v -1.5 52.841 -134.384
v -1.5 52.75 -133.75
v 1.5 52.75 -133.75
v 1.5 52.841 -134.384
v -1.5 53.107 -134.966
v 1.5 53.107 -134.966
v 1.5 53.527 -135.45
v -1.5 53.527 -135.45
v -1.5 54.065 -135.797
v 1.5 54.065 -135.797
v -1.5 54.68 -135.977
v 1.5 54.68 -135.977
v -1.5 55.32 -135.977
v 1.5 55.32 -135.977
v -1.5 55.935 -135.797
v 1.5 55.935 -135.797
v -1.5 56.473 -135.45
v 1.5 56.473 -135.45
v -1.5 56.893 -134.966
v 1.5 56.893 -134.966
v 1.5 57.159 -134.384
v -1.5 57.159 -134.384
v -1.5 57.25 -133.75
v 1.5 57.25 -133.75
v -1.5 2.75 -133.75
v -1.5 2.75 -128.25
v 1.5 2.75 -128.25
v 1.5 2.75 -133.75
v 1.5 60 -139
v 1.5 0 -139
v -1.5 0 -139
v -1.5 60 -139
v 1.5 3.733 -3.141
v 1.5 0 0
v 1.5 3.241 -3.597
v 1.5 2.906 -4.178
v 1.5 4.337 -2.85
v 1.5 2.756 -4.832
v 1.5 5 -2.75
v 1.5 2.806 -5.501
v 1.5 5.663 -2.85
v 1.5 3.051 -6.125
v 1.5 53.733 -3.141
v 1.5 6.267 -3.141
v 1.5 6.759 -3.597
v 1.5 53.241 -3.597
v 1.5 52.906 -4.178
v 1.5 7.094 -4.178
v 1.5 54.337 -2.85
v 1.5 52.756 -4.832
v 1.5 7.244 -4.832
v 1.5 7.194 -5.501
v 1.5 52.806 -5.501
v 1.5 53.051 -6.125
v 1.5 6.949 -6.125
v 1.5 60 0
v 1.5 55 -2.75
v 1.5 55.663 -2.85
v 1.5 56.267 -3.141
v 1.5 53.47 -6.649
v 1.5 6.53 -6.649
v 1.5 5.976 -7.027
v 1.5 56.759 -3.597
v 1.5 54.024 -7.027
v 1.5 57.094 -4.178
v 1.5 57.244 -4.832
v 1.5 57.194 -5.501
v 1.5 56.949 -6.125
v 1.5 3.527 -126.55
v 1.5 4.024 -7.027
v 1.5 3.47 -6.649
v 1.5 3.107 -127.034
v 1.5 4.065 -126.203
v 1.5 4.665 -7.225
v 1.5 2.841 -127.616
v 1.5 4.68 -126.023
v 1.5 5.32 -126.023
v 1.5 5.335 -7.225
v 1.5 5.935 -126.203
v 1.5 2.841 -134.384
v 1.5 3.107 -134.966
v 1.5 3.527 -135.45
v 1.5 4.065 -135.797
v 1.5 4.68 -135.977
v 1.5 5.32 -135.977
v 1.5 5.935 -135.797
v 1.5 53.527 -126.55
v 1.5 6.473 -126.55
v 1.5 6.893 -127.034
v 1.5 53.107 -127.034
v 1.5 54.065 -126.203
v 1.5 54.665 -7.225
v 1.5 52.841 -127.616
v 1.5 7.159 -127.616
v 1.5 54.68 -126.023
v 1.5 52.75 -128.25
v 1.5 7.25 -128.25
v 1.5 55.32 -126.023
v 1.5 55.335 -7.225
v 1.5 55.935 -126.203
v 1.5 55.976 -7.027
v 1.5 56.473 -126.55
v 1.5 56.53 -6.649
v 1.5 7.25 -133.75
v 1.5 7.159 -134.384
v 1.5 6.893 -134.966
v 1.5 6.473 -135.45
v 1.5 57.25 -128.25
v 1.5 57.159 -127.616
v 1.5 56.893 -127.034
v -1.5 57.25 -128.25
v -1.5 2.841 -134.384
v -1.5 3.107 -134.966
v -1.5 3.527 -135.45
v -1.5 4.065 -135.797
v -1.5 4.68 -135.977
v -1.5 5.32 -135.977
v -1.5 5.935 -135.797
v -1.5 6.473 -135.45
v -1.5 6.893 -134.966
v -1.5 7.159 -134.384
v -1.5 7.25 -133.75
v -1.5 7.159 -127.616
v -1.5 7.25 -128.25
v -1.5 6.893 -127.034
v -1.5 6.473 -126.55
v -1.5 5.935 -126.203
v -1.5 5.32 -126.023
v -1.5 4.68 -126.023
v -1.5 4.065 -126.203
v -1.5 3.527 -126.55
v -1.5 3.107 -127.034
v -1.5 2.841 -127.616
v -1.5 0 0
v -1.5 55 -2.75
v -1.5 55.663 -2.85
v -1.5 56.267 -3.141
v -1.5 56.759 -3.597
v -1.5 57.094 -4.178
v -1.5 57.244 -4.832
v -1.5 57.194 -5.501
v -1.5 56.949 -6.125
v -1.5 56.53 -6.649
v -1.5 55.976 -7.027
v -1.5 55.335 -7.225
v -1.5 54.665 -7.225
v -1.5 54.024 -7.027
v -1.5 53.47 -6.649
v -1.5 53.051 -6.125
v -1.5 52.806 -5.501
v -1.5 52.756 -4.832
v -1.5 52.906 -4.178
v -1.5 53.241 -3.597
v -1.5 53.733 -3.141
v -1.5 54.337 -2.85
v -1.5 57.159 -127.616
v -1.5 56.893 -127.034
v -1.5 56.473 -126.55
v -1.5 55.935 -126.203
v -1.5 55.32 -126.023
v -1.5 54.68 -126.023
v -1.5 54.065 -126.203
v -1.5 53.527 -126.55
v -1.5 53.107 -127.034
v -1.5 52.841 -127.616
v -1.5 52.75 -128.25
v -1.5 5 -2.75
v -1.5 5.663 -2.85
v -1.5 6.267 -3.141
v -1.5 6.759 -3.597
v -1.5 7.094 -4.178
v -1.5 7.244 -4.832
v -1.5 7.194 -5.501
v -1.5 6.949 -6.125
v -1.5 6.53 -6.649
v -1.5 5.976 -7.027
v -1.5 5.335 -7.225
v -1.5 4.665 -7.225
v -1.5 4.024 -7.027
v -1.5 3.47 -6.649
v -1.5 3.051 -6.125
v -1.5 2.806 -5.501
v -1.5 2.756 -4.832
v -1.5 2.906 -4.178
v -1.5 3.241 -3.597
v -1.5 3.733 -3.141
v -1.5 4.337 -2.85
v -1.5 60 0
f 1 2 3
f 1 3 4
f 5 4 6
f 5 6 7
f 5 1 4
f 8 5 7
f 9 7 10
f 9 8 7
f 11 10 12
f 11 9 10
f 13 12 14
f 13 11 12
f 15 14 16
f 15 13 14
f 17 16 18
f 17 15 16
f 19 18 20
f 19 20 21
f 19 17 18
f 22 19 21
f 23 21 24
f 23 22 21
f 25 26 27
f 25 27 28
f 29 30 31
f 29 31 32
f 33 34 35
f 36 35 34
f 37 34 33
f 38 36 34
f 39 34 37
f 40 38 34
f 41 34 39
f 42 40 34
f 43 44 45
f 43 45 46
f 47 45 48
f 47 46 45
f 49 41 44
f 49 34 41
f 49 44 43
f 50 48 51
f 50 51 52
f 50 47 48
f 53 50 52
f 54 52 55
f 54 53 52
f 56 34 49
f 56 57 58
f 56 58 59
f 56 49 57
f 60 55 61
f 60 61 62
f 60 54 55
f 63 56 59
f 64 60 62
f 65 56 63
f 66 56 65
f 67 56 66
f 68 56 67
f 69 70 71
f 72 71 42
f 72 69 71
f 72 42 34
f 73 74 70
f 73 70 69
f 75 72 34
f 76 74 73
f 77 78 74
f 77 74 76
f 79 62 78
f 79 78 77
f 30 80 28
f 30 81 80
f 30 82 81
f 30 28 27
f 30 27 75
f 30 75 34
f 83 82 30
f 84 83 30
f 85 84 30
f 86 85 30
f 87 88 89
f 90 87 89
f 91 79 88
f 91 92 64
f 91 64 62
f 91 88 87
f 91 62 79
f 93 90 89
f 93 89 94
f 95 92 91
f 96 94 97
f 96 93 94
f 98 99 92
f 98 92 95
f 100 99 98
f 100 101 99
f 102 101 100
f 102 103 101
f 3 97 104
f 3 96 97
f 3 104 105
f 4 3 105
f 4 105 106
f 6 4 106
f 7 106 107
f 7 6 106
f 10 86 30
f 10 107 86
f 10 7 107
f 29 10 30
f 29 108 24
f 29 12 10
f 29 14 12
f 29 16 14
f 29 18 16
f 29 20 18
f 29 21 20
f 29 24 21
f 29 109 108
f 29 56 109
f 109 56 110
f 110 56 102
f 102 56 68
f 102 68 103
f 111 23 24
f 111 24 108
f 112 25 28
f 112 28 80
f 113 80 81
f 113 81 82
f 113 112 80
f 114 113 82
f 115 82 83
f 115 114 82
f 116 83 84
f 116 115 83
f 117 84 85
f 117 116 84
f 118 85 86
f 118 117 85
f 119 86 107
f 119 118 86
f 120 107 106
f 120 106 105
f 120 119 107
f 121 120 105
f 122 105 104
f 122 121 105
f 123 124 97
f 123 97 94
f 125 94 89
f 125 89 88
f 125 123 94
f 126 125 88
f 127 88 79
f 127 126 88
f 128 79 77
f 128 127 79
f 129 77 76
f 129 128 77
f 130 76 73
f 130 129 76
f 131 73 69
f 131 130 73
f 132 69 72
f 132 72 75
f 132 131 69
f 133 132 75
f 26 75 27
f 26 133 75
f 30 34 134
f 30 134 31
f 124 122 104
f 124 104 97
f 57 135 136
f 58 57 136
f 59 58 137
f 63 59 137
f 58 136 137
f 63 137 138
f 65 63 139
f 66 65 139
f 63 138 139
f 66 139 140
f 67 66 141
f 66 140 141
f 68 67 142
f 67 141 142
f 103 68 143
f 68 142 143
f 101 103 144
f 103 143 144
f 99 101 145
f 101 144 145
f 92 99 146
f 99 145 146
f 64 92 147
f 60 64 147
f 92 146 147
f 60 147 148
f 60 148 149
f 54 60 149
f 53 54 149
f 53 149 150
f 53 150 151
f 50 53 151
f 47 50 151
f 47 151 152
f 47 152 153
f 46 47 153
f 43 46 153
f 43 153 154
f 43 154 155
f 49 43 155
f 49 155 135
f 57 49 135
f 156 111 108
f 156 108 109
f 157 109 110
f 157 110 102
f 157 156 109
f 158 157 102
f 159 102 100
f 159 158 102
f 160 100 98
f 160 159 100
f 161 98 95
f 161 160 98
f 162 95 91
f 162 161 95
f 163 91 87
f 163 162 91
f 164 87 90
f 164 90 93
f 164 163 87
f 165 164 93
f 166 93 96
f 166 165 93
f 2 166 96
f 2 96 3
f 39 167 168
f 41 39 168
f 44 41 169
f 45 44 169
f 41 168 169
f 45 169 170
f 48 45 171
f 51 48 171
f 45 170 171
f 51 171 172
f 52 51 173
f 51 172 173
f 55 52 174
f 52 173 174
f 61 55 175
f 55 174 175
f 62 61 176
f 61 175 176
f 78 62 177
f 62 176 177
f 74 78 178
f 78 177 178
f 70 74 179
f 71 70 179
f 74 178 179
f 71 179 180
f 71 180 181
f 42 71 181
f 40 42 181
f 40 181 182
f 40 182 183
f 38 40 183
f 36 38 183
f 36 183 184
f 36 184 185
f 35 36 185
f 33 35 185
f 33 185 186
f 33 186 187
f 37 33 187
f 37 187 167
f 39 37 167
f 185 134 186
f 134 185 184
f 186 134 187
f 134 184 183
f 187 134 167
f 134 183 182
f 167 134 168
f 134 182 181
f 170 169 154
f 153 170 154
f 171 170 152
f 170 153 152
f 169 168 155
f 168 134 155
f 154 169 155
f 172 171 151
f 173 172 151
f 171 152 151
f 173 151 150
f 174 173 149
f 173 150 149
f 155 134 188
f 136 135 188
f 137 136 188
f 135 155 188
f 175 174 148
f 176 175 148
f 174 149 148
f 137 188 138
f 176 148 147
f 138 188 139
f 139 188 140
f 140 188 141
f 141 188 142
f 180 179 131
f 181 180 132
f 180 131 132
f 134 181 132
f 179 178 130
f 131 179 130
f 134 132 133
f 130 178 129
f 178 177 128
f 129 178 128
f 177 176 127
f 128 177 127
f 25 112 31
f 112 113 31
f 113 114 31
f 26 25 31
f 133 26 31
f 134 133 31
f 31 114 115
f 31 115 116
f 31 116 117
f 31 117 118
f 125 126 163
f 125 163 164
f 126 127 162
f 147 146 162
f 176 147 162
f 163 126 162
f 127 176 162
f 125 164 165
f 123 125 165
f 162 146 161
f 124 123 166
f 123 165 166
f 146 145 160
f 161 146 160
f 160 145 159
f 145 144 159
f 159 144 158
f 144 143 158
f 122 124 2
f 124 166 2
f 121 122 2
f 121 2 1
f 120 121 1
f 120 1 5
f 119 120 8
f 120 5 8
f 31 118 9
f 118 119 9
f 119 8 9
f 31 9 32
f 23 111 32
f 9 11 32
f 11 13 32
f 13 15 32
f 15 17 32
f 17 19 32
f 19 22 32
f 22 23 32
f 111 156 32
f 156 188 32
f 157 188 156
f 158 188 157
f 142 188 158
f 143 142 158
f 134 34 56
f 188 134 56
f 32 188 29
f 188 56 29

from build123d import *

# Parameters (mm, degrees)
SKETCH_1_W               = 139
SKETCH_1_H               = 60
EXTRUDE_1_DEPTH          = 1.5
HOLE_WIZARD_M4_1_D       = 4.5
HOLE_START               = -1.5
HOLE_WIZARD_M4_1_2_DEPTH = 3


# Read off the part's stored shape, not the designer's step: M4 间隙槽口1
with BuildPart() as part:
    # 草图1 → 凸台-拉伸1 (new, symmetric)
    with BuildSketch(Plane(origin=(0, 0, 0), x_dir=(0, 0, -1), z_dir=(1, 0, 0))):
        with Locations((69.5, 30)):
            Rectangle(SKETCH_1_W, SKETCH_1_H)
    extrude(amount=EXTRUDE_1_DEPTH, both=True)

    # Hole Wizard M4 _1 (through all)
    with Locations(Plane(origin=(1.5, 0, 0), x_dir=(0, 0, -1), z_dir=(1, 0, 0))):
        with Locations((5, 55), (5, 5)):
            Hole(HOLE_WIZARD_M4_1_D / 2)

    # Hole Wizard M4 _1 2 outline → Hole Wizard M4 _1 2 (cut)
    with BuildSketch(Plane.YZ.offset(HOLE_START)):
        with BuildLine():
            Line((7.25, -133.75), (7.25, -128.25))
            ThreePointArc((7.25, -128.25), (5, -126), (2.75, -128.25))
            Line((2.75, -128.25), (2.75, -133.75))
            ThreePointArc((2.75, -133.75), (5, -136), (7.25, -133.75))
        make_face()
        with BuildLine():
            Line((57.25, -133.75), (57.25, -128.25))
            ThreePointArc((57.25, -128.25), (55, -126), (52.75, -128.25))
            Line((52.75, -128.25), (52.75, -133.75))
            ThreePointArc((52.75, -133.75), (55, -136), (57.25, -133.75))
        make_face()
    extrude(amount=HOLE_WIZARD_M4_1_2_DEPTH, mode=Mode.SUBTRACT)


solid = part.part
